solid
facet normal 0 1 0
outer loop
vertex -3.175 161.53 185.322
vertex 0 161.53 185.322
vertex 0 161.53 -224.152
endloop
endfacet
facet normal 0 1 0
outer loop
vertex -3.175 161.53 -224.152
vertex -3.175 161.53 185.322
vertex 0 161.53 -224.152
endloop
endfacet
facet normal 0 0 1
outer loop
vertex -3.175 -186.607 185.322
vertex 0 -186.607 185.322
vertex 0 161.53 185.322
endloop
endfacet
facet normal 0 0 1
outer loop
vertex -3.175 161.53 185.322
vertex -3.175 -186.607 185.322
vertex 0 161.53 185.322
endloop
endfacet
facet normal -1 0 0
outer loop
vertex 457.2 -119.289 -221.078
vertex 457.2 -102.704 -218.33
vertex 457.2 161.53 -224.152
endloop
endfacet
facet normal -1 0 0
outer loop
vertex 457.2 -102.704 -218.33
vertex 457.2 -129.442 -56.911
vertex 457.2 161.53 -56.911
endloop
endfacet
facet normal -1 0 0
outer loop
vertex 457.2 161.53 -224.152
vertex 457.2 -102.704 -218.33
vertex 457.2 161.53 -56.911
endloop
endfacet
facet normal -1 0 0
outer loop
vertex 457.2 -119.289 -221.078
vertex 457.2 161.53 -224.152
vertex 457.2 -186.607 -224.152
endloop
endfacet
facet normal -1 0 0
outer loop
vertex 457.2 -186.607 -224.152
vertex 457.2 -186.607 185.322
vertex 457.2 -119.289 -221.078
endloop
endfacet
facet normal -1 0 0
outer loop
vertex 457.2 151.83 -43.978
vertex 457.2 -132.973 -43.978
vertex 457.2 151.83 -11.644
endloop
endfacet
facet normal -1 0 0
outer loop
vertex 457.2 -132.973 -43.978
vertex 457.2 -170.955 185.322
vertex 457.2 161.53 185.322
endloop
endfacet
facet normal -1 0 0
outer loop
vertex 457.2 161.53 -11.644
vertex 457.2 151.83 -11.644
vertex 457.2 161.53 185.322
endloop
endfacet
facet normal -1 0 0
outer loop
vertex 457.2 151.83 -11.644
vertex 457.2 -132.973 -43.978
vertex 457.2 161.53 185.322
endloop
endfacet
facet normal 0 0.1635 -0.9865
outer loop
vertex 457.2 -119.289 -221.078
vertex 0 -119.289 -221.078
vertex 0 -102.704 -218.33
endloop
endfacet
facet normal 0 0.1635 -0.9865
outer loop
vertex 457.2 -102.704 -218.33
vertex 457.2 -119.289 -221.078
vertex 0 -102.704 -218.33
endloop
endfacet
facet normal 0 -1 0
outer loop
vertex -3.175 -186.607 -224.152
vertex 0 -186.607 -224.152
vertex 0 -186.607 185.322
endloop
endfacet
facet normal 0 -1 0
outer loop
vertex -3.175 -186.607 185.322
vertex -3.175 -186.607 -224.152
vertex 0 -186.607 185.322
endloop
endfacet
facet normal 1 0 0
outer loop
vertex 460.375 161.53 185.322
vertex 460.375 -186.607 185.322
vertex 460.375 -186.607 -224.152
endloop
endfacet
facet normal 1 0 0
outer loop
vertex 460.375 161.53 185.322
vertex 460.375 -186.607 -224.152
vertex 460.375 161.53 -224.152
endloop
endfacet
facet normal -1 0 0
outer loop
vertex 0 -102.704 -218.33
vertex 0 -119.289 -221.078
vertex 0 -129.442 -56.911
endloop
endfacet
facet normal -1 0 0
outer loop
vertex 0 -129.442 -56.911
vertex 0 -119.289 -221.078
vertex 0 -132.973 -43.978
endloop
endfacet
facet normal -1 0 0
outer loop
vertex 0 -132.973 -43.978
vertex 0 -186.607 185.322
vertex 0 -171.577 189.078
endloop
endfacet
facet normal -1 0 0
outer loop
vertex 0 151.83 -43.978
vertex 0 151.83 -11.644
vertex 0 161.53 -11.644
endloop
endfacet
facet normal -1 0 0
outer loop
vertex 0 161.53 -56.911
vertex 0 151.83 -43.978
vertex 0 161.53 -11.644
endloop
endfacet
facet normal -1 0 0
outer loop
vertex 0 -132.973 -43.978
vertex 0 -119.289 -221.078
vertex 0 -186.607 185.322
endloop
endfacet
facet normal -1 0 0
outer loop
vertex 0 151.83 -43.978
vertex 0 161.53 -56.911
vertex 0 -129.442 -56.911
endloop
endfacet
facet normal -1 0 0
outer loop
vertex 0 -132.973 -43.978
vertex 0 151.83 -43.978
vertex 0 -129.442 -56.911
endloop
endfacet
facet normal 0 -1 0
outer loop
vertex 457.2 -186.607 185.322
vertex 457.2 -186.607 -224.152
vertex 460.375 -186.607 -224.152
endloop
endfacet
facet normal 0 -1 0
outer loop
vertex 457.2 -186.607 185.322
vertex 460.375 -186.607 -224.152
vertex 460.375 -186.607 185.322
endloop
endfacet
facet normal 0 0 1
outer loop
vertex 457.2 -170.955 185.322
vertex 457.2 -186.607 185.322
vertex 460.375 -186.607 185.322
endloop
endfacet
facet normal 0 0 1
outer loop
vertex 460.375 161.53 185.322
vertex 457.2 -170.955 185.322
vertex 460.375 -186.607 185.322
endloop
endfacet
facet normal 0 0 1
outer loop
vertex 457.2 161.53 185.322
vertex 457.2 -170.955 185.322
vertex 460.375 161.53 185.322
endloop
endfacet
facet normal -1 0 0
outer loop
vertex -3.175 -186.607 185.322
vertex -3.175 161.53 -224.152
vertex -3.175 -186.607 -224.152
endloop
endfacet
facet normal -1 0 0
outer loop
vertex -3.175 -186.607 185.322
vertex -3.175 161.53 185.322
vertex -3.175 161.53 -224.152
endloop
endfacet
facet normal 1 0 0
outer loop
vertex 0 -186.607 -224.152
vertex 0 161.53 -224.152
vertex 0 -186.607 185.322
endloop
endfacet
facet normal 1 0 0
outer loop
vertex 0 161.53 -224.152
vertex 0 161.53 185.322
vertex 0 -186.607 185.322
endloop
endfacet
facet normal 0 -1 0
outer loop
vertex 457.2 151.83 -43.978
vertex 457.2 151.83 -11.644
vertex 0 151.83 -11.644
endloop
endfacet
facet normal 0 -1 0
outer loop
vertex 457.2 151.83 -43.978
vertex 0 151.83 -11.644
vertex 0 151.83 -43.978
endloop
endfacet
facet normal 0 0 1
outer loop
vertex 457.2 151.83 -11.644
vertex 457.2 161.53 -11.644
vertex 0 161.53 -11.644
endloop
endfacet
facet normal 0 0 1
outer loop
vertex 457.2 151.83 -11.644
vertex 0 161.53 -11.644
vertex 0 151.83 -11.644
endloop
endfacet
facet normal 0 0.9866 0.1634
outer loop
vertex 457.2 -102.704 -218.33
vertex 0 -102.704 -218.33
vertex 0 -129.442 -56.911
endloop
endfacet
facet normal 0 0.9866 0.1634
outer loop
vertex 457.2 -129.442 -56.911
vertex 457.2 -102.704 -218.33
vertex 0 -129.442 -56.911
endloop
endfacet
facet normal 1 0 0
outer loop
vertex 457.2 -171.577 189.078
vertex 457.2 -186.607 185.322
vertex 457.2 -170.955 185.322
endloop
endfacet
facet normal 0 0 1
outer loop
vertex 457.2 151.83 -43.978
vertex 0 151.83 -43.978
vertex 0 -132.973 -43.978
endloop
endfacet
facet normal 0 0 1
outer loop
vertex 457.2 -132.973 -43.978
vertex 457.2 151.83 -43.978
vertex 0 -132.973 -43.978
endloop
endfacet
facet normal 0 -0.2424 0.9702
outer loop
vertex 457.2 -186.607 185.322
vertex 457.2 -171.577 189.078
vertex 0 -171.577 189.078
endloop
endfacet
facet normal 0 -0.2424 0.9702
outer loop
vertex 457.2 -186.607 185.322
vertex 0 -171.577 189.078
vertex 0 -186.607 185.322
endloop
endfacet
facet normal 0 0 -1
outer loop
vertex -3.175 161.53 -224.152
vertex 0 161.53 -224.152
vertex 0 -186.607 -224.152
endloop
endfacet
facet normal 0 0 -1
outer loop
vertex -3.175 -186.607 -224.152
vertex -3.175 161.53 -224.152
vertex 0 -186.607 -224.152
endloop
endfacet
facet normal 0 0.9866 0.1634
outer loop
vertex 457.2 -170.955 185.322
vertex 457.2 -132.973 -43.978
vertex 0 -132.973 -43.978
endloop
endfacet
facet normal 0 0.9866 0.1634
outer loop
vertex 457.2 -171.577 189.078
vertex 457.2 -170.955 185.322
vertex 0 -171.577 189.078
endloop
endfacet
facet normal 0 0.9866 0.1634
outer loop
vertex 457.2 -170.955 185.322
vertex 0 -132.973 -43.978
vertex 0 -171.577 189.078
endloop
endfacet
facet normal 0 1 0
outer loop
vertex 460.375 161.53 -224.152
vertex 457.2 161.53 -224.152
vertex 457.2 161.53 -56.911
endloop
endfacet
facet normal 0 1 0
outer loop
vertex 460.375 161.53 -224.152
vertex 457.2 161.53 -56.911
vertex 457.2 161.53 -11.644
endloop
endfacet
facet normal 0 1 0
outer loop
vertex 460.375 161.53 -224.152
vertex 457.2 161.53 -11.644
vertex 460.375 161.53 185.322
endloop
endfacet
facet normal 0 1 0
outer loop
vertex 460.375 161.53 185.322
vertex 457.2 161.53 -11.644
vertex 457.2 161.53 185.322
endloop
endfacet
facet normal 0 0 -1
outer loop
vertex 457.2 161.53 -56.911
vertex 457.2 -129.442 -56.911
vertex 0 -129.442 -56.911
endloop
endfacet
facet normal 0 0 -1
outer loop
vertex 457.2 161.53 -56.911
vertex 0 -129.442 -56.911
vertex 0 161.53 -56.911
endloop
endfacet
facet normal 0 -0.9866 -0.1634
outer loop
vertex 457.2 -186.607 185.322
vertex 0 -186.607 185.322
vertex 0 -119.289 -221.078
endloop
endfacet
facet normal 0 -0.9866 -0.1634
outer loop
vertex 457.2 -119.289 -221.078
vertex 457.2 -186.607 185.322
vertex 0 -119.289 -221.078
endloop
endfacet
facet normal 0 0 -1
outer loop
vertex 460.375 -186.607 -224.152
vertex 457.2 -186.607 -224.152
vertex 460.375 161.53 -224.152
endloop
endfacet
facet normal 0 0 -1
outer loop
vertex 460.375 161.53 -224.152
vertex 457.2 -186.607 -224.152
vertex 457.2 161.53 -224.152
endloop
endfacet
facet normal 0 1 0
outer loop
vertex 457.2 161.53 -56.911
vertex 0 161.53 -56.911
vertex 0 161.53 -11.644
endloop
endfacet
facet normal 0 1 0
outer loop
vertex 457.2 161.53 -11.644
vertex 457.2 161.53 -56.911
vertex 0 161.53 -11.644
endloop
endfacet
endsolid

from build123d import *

# Parameters (mm, degrees)
F1_DEPTH = 457.2
F2_W     = 348.136375
F2_H     = 409.474525
F3_DEPTH = 3.175
F5_DEPTH = 3.175


with BuildPart() as f1:
    # F0 (on Right) → F1 (new body)
    with BuildSketch(Plane.YZ):
        Polygon((-171.577127, 189.078227), (-186.606751, 185.322377), (-119.288963, -221.077623), (-102.704249, -218.330462), (-129.442383, -56.911347), (161.529624, -56.911347), (161.529624, -11.644491), (151.829575, -11.644491), (151.829575, -43.97796), (-132.97273, -43.97796), align=None)
    extrude(amount=F1_DEPTH)

    # F2 (on face) → F3 (join)
    with BuildSketch(Plane.YZ.offset(457.2)):
        with Locations((-12.538564, -19.414885)):
            Rectangle(F2_W, F2_H)
    extrude(amount=F3_DEPTH)


with BuildPart() as f5:
    # F4 (on face) → F5 (new body)
    with BuildSketch(Plane(origin=(0, 0, 0), x_dir=(0, -1, 0), z_dir=(-1, 0, 0))):
        Polygon((-161.529624, -11.644491), (-161.529624, -56.911347), (-161.529624, -224.152148), (186.606751, -224.152148), (186.606751, 185.322377), (170.954992, 185.322377), (-161.529624, 185.322377), align=None)
    extrude(amount=F5_DEPTH)


solid = Compound([f1.part, f5.part])
